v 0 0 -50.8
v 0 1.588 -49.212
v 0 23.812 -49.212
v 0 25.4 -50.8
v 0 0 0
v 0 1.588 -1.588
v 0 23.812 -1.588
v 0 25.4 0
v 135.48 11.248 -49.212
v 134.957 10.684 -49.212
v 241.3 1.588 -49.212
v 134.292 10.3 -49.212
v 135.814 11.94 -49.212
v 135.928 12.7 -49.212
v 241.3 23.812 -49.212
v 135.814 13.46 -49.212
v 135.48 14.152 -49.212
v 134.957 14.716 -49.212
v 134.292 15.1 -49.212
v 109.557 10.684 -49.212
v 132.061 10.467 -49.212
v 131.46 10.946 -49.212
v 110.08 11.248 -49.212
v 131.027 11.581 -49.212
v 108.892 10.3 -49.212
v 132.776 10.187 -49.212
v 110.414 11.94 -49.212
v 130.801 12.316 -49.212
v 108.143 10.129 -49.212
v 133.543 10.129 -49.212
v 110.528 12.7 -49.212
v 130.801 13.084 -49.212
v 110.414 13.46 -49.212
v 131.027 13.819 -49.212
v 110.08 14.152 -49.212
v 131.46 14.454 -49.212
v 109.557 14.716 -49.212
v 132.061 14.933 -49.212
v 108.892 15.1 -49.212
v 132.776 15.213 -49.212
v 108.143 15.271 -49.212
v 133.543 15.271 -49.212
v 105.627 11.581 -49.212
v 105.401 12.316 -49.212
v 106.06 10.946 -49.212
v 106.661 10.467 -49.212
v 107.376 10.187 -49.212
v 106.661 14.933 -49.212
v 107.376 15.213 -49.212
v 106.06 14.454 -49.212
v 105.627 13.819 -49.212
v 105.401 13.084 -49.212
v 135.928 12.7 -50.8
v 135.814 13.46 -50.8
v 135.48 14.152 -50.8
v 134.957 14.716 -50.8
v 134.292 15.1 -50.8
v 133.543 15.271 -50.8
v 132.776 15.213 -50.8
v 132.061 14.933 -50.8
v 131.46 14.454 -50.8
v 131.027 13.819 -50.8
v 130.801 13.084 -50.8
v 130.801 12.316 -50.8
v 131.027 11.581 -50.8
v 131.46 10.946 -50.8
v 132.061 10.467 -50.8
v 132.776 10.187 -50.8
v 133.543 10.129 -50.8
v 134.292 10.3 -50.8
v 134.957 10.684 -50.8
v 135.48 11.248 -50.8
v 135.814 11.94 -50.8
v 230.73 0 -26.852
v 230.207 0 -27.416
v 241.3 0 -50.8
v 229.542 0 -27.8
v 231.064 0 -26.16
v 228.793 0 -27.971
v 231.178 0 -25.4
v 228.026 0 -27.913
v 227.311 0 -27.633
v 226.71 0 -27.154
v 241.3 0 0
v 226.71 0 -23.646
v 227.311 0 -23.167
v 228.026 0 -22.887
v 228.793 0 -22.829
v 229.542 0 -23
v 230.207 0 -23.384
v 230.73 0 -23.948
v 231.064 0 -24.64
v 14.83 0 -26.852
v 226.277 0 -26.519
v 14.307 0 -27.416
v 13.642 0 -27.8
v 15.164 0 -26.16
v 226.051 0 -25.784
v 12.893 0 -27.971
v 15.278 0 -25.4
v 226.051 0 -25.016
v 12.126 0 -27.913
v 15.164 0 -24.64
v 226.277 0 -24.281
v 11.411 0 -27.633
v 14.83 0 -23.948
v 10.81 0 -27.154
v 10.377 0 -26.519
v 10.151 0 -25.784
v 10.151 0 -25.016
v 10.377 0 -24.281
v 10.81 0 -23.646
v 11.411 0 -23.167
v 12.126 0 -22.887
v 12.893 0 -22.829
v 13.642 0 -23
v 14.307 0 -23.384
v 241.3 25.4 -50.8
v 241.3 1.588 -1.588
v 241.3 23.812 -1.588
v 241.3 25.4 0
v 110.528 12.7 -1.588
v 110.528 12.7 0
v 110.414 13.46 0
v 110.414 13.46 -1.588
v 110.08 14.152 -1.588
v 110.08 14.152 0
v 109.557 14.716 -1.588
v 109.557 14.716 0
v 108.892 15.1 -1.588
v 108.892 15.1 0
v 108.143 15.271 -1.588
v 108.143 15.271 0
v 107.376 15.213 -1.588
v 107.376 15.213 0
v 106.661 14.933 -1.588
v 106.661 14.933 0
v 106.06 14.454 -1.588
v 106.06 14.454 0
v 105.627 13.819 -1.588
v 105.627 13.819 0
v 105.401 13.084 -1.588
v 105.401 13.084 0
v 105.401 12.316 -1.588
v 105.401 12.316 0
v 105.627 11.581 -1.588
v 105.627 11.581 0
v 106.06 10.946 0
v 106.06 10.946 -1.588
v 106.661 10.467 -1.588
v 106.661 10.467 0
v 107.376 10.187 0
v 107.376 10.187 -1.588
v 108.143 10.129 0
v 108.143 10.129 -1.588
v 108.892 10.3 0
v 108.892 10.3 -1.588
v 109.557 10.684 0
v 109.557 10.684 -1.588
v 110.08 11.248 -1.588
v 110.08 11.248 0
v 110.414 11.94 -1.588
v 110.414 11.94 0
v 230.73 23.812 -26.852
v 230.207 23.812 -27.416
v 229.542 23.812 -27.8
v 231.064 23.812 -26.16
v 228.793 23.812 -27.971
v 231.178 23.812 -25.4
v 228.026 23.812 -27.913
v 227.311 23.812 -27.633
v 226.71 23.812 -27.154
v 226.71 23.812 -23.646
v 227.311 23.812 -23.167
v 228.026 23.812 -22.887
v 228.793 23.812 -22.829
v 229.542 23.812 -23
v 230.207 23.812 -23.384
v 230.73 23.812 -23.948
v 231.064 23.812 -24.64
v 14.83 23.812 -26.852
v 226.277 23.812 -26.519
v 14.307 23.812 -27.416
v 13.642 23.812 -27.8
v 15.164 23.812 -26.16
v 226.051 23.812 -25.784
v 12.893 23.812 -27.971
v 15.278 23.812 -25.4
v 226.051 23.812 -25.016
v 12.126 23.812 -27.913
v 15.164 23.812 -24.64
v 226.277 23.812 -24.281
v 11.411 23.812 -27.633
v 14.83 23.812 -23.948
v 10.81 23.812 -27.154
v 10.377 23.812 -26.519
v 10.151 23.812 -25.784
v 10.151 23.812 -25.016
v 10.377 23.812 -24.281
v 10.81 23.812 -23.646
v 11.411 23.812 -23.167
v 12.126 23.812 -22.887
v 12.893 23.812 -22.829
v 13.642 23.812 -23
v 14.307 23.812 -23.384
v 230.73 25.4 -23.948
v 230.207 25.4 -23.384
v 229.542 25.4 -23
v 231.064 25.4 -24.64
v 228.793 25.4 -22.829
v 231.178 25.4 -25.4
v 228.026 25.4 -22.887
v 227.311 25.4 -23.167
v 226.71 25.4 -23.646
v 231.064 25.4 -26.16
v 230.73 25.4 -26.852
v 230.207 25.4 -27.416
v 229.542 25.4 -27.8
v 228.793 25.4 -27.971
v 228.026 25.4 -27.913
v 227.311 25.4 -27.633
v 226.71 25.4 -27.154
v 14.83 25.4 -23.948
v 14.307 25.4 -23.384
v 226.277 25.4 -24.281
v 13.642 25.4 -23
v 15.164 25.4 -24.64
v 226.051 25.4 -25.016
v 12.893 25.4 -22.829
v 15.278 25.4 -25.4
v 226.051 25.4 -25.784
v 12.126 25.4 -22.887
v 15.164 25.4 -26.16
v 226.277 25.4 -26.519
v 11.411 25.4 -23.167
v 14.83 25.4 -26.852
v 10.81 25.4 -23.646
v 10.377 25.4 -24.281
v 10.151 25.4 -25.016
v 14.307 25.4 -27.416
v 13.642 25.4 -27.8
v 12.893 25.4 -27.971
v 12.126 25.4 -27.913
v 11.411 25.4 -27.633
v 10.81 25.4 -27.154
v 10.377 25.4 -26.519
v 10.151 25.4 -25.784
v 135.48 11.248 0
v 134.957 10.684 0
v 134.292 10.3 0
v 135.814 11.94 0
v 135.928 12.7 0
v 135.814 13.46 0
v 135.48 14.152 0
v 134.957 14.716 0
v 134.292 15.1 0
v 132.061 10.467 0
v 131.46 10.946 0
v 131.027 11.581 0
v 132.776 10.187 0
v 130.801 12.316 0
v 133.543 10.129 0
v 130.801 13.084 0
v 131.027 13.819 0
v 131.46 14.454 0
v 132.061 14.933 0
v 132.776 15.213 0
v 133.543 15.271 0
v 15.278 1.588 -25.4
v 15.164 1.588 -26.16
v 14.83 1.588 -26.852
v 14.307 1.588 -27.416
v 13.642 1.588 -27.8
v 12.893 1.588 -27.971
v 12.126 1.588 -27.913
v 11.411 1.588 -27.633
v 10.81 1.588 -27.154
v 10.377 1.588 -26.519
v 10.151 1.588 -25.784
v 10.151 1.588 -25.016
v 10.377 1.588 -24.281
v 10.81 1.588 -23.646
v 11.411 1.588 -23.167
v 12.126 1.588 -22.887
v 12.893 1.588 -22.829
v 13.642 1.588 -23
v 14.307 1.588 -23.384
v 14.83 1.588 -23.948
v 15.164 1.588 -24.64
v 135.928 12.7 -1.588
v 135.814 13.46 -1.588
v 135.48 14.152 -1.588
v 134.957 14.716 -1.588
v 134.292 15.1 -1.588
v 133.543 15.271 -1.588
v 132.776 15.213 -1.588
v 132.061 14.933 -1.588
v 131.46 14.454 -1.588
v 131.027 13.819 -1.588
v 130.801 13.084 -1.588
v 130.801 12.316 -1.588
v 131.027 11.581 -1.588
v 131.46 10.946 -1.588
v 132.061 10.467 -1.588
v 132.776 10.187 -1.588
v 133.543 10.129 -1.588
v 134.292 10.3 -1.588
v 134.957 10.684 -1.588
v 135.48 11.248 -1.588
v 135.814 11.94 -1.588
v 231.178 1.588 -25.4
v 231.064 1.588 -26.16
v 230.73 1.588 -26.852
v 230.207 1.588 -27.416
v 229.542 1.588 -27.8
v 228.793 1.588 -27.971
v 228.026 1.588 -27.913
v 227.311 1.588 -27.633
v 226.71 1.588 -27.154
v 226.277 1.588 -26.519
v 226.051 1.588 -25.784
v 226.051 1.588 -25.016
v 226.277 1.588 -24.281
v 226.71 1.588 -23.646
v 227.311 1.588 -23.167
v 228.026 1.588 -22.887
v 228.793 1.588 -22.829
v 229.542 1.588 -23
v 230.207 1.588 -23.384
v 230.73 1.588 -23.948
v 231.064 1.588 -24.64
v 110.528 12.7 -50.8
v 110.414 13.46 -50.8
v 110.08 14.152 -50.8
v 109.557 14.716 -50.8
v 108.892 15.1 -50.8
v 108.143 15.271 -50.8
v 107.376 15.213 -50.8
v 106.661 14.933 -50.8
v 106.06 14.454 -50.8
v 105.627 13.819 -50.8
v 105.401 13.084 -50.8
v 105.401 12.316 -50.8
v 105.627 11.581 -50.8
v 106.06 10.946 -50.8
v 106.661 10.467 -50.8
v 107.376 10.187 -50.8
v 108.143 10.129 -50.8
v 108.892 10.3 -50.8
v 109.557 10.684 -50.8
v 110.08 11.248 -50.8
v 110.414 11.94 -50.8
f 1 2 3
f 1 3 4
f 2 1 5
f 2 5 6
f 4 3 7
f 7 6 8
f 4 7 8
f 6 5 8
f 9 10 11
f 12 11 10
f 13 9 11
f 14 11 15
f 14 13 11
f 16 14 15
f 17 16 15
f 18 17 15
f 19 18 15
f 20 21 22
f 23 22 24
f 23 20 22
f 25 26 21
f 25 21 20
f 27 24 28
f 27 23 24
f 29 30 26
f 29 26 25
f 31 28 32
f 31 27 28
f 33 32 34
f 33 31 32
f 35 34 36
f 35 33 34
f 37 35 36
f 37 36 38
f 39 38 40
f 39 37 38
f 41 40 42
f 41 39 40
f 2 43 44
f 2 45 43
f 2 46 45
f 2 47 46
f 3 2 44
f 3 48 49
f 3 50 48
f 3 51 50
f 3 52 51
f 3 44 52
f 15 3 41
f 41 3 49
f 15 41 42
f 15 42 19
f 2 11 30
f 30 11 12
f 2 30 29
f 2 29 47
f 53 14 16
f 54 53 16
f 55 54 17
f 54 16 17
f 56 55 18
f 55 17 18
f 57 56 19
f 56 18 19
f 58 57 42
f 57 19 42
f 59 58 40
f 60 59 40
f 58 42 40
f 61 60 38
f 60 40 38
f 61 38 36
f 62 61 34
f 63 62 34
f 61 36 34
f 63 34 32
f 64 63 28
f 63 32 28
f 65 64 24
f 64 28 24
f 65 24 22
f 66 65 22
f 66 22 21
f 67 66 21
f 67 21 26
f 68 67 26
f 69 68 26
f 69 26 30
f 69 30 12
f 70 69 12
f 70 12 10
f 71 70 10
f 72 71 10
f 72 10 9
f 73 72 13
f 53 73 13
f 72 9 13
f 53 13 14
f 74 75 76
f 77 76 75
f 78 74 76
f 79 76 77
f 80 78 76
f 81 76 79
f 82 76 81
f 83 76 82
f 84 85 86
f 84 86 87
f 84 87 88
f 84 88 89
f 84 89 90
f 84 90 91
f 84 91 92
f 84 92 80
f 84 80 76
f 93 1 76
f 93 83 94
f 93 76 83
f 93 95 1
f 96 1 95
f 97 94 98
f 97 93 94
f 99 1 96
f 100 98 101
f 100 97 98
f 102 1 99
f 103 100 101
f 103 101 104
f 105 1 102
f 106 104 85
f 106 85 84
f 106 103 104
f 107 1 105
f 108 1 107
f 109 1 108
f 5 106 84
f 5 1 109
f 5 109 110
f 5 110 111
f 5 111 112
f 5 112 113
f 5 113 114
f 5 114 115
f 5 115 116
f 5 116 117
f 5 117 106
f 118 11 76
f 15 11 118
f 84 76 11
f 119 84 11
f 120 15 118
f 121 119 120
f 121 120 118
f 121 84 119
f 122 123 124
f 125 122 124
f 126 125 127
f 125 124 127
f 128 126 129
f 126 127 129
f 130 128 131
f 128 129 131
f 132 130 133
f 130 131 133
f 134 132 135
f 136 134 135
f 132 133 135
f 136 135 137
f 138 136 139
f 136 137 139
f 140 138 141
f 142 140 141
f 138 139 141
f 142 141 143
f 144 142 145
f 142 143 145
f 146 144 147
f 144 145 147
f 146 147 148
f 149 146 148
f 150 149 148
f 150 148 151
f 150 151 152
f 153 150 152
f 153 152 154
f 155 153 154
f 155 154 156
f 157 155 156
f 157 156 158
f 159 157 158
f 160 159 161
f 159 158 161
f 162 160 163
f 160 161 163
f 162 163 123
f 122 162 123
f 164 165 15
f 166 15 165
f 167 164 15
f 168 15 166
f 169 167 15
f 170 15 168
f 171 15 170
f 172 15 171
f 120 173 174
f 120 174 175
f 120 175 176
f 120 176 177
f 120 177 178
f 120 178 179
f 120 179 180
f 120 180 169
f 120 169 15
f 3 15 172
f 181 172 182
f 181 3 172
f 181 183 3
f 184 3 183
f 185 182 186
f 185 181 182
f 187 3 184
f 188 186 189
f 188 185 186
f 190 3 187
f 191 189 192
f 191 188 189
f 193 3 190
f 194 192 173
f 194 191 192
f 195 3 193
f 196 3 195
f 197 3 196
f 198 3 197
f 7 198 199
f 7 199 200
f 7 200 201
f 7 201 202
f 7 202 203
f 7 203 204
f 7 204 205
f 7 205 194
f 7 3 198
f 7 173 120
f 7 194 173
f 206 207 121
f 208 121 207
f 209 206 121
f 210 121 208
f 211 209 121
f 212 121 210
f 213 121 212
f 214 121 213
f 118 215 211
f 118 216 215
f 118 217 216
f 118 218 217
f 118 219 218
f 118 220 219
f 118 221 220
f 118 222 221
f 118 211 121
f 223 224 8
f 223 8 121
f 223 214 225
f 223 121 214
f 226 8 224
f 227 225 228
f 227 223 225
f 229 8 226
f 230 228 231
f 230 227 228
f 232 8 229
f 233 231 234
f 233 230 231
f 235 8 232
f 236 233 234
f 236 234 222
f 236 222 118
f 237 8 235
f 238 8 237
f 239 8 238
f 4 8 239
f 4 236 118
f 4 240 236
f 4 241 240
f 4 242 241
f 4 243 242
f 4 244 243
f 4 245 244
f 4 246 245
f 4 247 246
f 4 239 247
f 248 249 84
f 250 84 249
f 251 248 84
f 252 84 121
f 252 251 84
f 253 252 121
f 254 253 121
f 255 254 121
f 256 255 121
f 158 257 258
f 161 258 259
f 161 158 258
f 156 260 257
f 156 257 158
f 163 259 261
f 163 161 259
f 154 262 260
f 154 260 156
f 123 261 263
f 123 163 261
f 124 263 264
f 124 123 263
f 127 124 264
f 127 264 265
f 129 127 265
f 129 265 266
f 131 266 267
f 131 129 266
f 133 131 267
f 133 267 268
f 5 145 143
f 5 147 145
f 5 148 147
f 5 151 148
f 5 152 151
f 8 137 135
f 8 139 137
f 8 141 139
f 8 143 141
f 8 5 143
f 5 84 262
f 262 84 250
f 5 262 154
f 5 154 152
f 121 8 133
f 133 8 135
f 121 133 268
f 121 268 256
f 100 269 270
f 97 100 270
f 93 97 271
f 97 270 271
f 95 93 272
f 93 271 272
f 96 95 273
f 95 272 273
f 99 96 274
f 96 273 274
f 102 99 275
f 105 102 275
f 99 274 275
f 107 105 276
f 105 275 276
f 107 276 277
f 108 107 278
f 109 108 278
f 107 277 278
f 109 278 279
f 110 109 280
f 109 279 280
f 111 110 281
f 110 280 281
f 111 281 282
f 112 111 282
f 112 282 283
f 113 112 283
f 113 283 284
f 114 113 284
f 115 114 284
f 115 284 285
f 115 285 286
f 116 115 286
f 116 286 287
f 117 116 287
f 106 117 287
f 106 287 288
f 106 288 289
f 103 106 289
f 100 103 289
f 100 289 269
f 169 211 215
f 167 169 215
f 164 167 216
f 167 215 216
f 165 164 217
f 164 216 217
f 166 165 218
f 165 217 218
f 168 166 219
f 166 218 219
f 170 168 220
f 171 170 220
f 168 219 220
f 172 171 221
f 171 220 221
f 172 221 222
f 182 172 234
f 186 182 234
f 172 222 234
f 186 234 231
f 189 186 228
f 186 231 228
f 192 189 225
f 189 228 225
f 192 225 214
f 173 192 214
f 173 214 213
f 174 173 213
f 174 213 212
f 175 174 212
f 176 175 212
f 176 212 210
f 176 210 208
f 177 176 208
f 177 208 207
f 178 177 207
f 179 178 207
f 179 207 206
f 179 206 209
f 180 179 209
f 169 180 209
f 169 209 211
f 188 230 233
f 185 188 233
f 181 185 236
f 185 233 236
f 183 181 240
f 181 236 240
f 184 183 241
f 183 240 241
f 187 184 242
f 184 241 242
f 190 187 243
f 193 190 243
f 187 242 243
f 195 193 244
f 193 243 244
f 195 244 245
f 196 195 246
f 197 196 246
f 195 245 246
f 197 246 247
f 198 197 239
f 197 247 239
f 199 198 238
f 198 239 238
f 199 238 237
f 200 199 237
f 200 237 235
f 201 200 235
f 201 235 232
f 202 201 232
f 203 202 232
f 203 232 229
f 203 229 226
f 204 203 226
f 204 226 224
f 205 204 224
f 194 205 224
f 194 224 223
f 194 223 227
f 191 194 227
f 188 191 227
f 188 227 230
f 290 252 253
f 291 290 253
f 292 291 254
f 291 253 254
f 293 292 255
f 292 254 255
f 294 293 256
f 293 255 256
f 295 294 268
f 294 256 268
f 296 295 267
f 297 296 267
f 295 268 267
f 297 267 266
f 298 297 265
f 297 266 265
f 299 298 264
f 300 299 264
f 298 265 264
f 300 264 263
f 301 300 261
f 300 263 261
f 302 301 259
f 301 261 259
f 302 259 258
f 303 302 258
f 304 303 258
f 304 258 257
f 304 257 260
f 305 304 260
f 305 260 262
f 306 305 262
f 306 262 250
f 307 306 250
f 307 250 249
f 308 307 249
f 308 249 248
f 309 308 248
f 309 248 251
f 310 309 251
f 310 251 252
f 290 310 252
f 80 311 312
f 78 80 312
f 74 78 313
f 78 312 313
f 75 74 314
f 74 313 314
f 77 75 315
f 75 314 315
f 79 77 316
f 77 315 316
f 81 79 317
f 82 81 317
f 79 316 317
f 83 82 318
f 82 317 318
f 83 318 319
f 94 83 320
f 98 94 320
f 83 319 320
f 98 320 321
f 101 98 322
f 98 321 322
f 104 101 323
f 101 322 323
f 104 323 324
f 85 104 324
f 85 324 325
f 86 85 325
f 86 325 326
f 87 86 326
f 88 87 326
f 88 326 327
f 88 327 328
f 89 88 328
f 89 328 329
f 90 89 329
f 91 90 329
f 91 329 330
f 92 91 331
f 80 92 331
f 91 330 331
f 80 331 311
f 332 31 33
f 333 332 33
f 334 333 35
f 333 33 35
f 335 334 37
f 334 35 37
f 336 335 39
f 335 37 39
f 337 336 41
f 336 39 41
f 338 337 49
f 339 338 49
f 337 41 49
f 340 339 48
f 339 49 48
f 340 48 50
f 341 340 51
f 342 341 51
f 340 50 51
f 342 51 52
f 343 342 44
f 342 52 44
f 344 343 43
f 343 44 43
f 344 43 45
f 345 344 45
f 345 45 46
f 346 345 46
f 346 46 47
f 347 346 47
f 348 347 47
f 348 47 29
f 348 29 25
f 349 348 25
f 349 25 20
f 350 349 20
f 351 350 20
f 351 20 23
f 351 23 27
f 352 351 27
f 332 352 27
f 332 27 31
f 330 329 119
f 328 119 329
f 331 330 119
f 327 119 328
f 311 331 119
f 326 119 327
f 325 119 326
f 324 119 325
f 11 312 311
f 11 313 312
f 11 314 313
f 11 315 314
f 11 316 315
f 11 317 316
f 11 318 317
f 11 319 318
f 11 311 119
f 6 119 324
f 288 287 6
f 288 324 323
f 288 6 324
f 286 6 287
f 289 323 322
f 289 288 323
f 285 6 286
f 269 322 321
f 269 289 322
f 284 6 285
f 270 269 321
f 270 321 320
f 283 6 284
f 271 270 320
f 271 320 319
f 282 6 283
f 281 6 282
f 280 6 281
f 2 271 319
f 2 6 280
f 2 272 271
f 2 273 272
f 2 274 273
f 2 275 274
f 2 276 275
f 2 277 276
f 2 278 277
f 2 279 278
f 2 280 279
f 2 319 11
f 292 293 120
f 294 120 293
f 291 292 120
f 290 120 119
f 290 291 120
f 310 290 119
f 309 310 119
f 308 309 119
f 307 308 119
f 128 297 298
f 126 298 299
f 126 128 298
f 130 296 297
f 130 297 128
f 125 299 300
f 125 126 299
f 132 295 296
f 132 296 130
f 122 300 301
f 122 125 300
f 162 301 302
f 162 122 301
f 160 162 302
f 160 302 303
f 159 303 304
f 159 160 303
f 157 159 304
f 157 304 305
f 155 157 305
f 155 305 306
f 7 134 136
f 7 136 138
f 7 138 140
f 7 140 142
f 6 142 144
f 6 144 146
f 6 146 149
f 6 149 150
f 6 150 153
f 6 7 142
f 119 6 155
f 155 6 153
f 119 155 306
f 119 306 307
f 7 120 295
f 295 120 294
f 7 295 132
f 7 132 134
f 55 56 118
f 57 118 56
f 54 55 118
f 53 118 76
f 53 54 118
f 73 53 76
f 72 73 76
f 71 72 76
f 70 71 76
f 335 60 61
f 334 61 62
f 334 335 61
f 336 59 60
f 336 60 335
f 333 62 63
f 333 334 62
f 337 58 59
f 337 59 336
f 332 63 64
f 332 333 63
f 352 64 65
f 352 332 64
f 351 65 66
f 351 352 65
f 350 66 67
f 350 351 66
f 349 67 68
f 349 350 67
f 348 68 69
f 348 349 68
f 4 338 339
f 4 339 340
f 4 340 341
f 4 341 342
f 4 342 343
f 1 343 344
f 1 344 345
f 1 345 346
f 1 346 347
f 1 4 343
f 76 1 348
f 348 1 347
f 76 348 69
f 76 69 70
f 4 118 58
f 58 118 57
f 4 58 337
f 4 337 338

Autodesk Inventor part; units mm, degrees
ref_plane "YZ Plane" through (0, 0, 0) normal (1, 0, 0) x (0, 1, 0)
ref_plane "XZ Plane" through (0, 0, 0) normal (0, 1, 0) x (-1, 0, 0)
ref_plane "XY Plane" through (0, 0, 0) normal (0, 0, 1) x (1, 0, 0)
sketch "Sketch1" plane through (0, 0, 0) normal (1, 0, 0) x (0, 1, 0)
  line L0 (0, 0) -> (25.4, 0)
  line L1 (25.4, 0) -> (25.4, -50.8)
  line L2 (25.4, -50.8) -> (0, -50.8)
  line L3 (0, -50.8) -> (0, 0)
  line L4 (23.8125, -1.5875) -> (1.5875, -1.5875)
  line L5 (1.5875, -1.5875) -> (1.5875, -49.2125)
  line L6 (1.5875, -49.2125) -> (23.8125, -49.2125)
  line L7 (23.8125, -49.2125) -> (23.8125, -1.5875)
  dimension "d0" = 25.4
  dimension "d1" = 50.8
  dimension "d2" = 1.5875
extrude "Extrusion1" add sketch "Sketch1" along normal blind 241.3
sketch "Sketch2" plane through (0, 25.4, 0) normal (0, 1, 0) x (1, 0, 0)
  line L0 (0, 50.8) -> (0, 0) projected
  line L1 (0, 0) -> (241.3, 0) projected
  line L2 (241.3, 50.8) -> (241.3, 0) projected
  line L3 (0, 50.8) -> (241.3, 50.8) projected
  circle A0 centre (12.7, 25.4) radius 2.5781
  circle A1 centre (228.6, 25.4) radius 2.5781
  point P0 (0, 0)
  dimension "d5" = 5.1562
  dimension "d6" = 12.7
  dimension "d7" = 5.1562
  dimension "d8" = 12.7
  dimension "d9" = 25.4
  dimension "d10" = 25.4
extrude "Extrusion2" cut sketch "Sketch2" against normal blind 25.4 contours A0 | A1
sketch "Sketch4" plane through (0, 0, 0) normal (0, 0, 1) x (1, 0, 0)
  line L0 (0, 25.4) -> (0, 0) projected
  line L1 (0, 0) -> (241.3, 0) projected
  line L2 (241.3, 25.4) -> (241.3, 0) projected
  line L3 (0, 25.4) -> (241.3, 25.4) projected
  line L4 (120.65, 25.4) -> (120.65, 0) construction
  circle A0 centre (107.95, 12.7) radius 2.5781
  circle A1 centre (133.35, 12.7) radius 2.5781
  dimension "d21" = 5.1562
  dimension "d22" = 5.1562
  dimension "d23" = 12.7
  dimension "d24" = 25.4
  dimension "d27" = 12.7
  dimension "d28" = 12.7
extrude "Extrusion4" cut sketch "Sketch4" against normal through all contours A0 | A1
properties part number "2inTubeBase"
